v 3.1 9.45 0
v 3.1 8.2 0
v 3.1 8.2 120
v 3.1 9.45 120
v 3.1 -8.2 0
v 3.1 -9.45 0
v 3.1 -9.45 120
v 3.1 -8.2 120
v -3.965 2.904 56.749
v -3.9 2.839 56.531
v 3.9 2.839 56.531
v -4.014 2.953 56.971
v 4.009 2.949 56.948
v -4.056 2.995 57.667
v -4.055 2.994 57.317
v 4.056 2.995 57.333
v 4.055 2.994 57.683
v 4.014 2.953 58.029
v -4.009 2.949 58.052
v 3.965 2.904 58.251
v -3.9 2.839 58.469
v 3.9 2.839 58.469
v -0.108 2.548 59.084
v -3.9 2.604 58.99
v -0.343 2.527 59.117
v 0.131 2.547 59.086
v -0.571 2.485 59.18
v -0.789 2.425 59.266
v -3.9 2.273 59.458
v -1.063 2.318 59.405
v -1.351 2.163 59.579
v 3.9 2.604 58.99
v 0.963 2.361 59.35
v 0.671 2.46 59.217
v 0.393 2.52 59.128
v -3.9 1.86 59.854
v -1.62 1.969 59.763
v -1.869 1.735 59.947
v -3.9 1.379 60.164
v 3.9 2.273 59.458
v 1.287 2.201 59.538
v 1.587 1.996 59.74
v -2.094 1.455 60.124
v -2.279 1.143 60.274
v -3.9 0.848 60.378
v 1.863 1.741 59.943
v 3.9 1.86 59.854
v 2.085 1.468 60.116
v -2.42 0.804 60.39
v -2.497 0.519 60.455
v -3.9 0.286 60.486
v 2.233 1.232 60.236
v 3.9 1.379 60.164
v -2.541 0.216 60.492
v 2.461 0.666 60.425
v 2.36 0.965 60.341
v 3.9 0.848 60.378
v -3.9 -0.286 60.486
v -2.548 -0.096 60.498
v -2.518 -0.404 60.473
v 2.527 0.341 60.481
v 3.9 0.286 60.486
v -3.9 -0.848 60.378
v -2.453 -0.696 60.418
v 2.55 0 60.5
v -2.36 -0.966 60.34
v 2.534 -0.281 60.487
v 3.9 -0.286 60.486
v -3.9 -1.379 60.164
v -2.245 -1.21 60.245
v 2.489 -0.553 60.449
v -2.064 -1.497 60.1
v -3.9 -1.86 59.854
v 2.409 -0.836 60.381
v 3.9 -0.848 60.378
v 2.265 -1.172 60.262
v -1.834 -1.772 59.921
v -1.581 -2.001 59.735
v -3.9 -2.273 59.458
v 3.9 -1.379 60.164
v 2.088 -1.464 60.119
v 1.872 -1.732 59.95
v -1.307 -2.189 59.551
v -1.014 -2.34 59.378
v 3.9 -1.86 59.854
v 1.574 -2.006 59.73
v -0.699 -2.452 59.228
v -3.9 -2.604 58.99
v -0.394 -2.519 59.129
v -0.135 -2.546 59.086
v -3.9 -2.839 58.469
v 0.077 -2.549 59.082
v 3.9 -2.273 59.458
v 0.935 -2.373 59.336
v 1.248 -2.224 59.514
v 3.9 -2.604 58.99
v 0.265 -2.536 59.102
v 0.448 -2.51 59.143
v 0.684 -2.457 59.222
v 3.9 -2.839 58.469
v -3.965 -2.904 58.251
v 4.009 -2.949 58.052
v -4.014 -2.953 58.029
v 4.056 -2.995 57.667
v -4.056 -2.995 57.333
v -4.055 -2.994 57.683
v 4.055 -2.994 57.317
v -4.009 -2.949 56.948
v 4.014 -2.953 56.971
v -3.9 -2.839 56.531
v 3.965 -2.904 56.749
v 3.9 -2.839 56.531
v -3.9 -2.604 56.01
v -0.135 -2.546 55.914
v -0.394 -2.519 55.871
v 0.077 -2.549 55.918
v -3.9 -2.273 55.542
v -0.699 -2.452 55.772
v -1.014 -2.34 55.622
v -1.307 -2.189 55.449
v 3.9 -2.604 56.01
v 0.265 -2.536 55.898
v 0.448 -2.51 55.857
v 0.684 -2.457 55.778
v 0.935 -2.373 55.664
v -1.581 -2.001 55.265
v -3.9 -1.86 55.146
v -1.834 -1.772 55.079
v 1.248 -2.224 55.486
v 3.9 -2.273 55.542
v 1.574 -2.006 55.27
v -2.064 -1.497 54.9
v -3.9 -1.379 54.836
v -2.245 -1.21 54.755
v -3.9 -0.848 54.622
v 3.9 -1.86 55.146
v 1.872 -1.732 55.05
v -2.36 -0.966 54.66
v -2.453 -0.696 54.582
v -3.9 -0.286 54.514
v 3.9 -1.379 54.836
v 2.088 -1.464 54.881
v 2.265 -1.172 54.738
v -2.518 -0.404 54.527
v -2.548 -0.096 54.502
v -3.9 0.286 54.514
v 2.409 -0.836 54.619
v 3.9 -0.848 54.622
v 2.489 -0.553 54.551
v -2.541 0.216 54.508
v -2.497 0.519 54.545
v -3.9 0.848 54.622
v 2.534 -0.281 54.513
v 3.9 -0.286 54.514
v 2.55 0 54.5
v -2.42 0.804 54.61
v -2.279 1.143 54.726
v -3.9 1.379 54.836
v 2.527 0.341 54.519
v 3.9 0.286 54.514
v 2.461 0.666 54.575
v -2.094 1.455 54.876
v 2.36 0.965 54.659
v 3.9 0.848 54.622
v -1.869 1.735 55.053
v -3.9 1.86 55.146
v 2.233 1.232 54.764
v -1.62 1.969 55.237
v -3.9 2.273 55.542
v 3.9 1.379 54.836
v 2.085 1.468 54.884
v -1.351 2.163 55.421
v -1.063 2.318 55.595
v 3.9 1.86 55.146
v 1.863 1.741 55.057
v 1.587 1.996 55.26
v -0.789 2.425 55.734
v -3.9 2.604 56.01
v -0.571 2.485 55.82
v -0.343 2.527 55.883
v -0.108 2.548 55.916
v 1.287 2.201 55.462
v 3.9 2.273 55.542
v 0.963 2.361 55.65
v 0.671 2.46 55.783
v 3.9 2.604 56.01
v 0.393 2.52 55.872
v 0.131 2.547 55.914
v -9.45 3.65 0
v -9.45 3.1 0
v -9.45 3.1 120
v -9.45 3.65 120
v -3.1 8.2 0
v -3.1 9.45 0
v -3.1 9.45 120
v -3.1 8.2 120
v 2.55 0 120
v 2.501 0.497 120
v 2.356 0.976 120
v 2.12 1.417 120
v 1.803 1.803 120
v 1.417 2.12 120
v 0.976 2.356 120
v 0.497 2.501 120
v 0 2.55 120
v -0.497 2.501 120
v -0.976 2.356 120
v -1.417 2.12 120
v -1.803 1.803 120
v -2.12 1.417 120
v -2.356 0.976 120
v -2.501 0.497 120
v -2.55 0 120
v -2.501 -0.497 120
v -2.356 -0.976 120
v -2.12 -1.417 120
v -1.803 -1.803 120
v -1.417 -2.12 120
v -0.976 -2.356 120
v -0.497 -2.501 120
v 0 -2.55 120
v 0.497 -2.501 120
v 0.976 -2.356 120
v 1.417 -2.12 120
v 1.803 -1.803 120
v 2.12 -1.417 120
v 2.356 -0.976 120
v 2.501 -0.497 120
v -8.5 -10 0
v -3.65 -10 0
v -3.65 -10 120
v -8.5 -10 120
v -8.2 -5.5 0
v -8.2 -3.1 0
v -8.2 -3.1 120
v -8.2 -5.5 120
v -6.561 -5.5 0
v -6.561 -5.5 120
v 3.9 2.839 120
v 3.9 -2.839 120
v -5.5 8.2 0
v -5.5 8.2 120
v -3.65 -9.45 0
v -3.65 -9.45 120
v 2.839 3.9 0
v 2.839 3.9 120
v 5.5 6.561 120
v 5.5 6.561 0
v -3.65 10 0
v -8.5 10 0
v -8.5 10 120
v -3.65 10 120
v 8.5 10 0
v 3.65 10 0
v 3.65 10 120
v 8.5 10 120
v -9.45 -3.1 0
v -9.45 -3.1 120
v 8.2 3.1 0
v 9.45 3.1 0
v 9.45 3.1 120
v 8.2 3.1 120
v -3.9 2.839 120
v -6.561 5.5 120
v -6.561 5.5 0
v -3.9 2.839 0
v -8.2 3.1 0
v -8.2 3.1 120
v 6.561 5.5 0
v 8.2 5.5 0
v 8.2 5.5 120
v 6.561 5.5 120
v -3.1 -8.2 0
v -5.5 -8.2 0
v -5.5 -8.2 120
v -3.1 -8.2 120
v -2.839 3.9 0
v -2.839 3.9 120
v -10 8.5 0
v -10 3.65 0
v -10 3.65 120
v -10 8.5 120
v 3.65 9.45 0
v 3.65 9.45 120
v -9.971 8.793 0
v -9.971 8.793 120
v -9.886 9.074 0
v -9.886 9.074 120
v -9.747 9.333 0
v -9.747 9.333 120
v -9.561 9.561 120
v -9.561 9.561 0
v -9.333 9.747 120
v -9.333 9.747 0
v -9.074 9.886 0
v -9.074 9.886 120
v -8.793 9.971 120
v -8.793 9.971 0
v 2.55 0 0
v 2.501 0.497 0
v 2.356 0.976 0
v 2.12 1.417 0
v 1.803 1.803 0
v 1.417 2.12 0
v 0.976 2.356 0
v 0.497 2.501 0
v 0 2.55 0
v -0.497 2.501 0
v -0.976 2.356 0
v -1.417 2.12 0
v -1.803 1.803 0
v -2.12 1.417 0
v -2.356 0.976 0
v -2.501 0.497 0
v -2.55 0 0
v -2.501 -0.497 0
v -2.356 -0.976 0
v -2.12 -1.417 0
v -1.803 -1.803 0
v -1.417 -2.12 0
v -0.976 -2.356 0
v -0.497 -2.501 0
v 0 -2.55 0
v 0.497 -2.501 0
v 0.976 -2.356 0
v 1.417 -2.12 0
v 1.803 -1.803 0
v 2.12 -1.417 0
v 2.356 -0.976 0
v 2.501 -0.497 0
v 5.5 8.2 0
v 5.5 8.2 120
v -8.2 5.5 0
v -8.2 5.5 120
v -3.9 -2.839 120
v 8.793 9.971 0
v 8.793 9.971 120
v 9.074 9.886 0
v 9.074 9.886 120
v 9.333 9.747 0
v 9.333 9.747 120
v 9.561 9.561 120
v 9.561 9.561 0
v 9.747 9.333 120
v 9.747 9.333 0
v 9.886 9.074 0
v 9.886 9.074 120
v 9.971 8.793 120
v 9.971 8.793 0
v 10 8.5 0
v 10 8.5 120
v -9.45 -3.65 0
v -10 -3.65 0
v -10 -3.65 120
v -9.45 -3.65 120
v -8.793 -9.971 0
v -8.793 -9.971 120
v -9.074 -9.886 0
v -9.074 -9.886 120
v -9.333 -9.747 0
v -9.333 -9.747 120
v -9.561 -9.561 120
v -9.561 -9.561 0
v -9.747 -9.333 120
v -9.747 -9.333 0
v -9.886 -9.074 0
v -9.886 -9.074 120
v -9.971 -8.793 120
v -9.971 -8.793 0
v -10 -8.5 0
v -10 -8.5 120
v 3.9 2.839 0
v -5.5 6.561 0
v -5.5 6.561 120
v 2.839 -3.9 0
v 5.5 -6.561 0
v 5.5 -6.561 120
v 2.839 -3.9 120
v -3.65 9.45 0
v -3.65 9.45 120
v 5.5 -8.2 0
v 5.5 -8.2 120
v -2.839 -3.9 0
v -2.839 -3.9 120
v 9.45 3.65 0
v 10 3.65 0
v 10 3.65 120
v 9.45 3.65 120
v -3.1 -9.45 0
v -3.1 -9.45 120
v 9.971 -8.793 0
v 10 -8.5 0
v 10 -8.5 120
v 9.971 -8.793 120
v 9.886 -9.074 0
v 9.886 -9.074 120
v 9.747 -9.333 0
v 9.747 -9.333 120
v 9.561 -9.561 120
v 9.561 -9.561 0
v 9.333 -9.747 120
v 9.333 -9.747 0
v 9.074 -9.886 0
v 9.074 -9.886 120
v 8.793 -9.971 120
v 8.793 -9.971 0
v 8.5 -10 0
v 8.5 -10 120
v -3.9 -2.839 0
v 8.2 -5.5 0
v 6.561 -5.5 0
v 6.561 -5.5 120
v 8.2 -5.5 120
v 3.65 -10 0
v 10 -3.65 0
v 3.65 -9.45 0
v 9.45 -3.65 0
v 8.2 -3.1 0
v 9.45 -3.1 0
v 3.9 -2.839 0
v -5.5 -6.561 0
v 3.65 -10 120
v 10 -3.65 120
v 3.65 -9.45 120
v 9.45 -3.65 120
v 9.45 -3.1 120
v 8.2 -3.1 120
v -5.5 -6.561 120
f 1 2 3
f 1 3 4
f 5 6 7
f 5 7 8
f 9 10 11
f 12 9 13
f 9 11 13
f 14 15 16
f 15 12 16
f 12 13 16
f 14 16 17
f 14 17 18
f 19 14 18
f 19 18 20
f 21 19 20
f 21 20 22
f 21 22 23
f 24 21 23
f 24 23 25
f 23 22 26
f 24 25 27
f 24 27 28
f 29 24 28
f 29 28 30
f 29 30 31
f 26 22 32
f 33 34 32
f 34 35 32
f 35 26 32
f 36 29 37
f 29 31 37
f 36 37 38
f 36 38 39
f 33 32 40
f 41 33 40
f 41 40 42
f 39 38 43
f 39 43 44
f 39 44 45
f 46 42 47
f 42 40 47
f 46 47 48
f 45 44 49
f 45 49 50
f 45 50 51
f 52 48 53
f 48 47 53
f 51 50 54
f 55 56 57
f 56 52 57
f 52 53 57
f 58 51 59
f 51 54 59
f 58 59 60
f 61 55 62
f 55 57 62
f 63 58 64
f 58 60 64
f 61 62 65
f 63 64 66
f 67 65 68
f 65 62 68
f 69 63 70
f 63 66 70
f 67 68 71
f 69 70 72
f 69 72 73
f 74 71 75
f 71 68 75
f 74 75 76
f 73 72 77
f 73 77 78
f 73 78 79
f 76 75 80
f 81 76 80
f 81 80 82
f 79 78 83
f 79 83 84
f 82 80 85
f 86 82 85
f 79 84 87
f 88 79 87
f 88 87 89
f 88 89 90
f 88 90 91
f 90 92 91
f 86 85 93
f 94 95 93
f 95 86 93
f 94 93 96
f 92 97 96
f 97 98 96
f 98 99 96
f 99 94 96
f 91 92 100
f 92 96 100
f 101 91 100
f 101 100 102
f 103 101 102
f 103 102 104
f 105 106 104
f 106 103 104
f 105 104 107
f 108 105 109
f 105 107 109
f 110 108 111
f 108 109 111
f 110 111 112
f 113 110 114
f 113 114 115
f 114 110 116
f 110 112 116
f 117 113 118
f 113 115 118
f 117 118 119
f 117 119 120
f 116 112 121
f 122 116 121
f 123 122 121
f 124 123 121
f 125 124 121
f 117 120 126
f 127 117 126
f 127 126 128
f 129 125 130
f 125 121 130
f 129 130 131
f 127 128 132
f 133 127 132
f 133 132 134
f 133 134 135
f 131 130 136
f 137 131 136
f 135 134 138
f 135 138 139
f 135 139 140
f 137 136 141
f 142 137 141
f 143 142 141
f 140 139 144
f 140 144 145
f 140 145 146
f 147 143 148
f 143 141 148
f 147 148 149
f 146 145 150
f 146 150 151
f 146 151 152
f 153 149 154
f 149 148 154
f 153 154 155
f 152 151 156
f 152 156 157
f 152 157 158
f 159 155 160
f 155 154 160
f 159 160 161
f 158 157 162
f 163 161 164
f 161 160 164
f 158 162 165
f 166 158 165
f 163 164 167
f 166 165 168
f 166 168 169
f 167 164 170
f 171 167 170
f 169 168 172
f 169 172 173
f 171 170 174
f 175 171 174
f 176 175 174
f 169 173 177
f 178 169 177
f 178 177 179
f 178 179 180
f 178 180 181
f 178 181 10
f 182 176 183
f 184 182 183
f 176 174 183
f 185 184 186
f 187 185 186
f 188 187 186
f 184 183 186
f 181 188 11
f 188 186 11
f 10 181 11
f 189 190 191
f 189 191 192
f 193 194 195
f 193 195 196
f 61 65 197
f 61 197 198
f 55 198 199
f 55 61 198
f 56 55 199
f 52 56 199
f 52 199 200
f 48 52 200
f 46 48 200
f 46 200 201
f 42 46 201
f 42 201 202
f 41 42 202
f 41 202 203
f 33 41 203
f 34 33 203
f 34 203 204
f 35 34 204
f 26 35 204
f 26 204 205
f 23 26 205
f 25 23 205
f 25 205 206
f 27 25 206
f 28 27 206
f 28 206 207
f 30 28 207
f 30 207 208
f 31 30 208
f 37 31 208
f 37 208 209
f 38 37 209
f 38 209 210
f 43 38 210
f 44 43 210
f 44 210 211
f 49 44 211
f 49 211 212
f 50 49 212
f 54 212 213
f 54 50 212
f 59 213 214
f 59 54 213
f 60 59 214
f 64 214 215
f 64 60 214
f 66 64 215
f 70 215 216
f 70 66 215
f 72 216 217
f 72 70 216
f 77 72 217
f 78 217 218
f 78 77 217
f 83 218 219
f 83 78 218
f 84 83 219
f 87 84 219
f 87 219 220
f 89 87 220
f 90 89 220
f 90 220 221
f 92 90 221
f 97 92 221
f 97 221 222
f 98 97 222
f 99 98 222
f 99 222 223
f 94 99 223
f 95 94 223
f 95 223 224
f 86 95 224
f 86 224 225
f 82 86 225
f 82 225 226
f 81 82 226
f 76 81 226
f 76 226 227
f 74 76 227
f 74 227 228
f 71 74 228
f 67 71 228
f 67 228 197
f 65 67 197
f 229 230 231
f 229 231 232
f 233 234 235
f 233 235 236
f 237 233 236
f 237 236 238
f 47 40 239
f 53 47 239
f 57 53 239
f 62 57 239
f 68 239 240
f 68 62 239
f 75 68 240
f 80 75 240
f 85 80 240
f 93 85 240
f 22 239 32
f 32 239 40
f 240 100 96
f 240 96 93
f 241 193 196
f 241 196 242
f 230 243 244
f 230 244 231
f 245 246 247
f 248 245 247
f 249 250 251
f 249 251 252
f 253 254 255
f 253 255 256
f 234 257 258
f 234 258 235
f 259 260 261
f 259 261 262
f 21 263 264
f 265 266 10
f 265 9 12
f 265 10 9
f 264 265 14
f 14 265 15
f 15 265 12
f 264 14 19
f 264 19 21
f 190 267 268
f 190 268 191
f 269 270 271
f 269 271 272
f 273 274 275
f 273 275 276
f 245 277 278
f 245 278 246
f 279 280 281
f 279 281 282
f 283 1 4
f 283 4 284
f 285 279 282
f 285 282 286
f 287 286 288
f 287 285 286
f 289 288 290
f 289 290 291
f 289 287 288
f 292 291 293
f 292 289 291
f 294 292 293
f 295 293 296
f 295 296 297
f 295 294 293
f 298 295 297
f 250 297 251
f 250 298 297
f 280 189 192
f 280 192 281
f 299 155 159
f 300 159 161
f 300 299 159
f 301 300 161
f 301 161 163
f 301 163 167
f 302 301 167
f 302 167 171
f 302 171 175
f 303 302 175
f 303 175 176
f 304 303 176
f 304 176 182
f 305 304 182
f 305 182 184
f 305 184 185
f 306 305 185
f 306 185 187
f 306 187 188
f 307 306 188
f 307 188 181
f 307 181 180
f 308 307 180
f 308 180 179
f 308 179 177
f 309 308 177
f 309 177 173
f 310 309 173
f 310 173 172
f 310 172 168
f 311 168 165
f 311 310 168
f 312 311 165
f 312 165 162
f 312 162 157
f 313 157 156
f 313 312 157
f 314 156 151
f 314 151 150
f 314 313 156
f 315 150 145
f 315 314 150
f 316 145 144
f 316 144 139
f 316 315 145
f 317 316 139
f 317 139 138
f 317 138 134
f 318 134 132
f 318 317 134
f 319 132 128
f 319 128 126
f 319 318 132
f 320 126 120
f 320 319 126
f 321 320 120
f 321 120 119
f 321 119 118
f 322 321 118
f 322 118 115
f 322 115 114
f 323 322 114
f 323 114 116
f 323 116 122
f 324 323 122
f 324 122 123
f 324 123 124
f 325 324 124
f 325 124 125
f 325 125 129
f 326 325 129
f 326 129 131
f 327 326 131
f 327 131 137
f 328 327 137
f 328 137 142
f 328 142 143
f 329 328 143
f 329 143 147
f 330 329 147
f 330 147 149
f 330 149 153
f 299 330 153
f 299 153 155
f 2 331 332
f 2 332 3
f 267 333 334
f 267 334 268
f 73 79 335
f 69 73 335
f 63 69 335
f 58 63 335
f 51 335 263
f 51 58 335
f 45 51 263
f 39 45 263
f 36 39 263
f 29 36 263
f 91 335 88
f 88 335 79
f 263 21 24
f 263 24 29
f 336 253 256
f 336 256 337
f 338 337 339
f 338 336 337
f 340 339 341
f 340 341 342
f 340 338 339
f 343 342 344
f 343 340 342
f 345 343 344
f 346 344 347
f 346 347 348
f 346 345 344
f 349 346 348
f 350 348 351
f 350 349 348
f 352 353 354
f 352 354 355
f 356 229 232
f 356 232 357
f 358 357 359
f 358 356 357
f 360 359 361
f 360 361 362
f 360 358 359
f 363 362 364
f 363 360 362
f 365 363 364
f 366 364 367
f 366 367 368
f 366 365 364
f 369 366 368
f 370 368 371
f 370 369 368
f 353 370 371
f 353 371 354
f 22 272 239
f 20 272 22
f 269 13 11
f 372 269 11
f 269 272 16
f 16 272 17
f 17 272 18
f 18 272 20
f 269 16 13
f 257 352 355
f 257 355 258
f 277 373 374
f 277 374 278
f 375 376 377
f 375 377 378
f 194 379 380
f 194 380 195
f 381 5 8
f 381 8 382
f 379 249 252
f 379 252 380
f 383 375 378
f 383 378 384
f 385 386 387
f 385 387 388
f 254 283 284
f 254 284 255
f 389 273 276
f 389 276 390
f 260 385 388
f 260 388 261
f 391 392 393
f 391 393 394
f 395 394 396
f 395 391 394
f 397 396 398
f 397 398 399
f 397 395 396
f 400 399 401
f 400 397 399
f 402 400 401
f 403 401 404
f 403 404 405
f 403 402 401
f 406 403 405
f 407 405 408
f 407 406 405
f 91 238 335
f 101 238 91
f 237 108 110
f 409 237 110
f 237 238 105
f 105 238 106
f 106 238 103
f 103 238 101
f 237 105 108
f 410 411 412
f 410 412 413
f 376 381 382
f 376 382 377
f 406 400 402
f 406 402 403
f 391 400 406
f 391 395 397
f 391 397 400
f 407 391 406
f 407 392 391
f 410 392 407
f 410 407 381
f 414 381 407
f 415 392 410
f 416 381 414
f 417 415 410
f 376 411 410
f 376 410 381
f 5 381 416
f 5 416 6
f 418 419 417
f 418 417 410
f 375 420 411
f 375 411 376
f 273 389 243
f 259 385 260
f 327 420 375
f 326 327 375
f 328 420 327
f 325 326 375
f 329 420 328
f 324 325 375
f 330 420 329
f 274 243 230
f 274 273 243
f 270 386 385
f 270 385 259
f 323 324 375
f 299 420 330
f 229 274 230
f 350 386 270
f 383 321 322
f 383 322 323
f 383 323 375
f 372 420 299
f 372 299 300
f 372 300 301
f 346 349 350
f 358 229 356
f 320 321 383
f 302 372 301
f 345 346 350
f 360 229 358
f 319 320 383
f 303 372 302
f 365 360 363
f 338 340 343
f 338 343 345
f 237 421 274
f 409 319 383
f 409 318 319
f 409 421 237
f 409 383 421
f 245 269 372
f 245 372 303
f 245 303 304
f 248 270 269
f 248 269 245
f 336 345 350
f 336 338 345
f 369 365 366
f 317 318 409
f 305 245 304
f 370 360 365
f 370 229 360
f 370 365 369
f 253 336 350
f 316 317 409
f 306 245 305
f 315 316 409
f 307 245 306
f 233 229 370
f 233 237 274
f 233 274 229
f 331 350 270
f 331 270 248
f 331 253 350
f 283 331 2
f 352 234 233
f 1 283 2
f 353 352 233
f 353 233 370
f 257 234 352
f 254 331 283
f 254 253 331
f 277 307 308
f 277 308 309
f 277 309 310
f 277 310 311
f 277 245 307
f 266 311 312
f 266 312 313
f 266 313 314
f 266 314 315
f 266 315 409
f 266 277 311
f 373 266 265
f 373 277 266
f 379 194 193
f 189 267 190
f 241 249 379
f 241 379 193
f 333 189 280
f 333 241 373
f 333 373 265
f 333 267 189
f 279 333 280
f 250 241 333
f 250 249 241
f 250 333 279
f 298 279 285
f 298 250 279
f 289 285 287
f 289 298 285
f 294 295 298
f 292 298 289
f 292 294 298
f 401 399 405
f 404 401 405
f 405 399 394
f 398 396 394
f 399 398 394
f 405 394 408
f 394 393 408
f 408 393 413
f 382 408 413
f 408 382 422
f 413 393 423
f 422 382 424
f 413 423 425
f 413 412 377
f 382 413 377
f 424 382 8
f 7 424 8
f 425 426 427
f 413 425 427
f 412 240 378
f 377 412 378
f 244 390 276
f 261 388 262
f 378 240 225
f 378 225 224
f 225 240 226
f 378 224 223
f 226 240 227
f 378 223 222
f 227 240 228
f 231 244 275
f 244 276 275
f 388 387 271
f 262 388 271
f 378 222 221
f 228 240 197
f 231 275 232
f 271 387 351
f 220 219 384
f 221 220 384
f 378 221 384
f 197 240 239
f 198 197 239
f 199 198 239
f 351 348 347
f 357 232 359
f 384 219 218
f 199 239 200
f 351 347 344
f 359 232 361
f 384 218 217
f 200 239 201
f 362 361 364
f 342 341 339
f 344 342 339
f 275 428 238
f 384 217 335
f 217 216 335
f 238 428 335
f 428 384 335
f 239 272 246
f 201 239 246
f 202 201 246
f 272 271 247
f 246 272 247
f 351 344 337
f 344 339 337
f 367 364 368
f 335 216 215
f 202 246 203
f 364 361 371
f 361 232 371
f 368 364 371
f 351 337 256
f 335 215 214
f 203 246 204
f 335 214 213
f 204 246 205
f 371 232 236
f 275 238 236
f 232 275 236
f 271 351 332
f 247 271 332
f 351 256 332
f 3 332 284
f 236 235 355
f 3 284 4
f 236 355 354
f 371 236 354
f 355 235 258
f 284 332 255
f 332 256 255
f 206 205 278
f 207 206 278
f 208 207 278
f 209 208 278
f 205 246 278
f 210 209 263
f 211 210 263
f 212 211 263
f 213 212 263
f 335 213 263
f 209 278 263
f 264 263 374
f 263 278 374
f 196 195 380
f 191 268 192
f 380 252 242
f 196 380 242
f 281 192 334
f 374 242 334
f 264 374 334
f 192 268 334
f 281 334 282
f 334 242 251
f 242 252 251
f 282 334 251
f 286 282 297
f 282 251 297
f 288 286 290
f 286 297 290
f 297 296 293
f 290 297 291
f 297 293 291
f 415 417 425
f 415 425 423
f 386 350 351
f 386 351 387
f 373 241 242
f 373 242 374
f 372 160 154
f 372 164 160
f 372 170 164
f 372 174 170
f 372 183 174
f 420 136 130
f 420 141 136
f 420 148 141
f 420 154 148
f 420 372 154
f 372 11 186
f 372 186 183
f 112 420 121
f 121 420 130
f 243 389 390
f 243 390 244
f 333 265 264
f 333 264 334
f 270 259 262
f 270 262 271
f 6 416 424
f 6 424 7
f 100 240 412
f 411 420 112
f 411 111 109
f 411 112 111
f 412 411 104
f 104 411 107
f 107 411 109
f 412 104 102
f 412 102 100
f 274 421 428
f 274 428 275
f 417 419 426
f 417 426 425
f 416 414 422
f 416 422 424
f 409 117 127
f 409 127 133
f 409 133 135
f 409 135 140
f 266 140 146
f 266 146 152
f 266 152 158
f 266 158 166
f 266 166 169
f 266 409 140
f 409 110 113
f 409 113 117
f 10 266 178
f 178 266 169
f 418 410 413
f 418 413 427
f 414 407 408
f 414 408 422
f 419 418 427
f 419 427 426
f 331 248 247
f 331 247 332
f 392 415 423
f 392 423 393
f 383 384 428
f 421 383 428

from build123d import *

# Parameters (mm, degrees)
SKETCH_2_R          = 2.55
EXTRUDE_1_DEPTH     = 120
SKETCH_3_R          = 3
CUT_EXTRUDE_1_DEPTH = 123.065556157


with BuildPart() as part:
    # 草图2 → 凸台-拉伸1 (new body)
    with BuildSketch(Plane.XY):
        with BuildLine():
            Line((-3.9, 2.839339828), (-6.560660172, 5.5))
            Line((-6.560660172, 5.5), (-8.2, 5.5))
            Line((-8.2, 5.5), (-8.2, 3.1))
            Line((-8.2, 3.1), (-9.45, 3.1))
            Line((-9.45, 3.1), (-9.45, 3.65))
            Line((-9.45, 3.65), (-10, 3.65))
            Line((-10, 3.65), (-10, 8.5))
            ThreePointArc((-10, 8.5), (-9.560660172, 9.560660172), (-8.5, 10))
            Line((-8.5, 10), (-3.65, 10))
            Line((-3.65, 10), (-3.65, 9.45))
            Line((-3.65, 9.45), (-3.1, 9.45))
            Line((-3.1, 9.45), (-3.1, 8.2))
            Line((-3.1, 8.2), (-5.5, 8.2))
            Line((-5.5, 8.2), (-5.5, 6.560660172))
            Line((-5.5, 6.560660172), (-2.839339828, 3.9))
            Line((-2.839339828, 3.9), (2.839339828, 3.9))
            Line((2.839339828, 3.9), (5.5, 6.560660172))
            Line((5.5, 6.560660172), (5.5, 8.2))
            Line((5.5, 8.2), (3.1, 8.2))
            Line((3.1, 8.2), (3.1, 9.45))
            Line((3.1, 9.45), (3.65, 9.45))
            Line((3.65, 9.45), (3.65, 10))
            Line((3.65, 10), (8.5, 10))
            ThreePointArc((8.5, 10), (9.560660172, 9.560660172), (10, 8.5))
            Line((10, 8.5), (10, 3.65))
            Line((10, 3.65), (9.45, 3.65))
            Line((9.45, 3.65), (9.45, 3.1))
            Line((9.45, 3.1), (8.2, 3.1))
            Line((8.2, 3.1), (8.2, 5.5))
            Line((8.2, 5.5), (6.560660172, 5.5))
            Line((6.560660172, 5.5), (3.9, 2.839339828))
            Line((3.9, 2.839339828), (3.9, -2.839339828))
            Line((3.9, -2.839339828), (6.560660172, -5.5))
            Line((6.560660172, -5.5), (8.2, -5.5))
            Line((8.2, -5.5), (8.2, -3.1))
            Line((8.2, -3.1), (9.45, -3.1))
            Line((9.45, -3.1), (9.45, -3.65))
            Line((9.45, -3.65), (10, -3.65))
            Line((10, -3.65), (10, -8.5))
            ThreePointArc((10, -8.5), (9.560660172, -9.560660172), (8.5, -10))
            Line((8.5, -10), (3.65, -10))
            Line((3.65, -10), (3.65, -9.45))
            Line((3.65, -9.45), (3.1, -9.45))
            Line((3.1, -9.45), (3.1, -8.2))
            Line((3.1, -8.2), (5.5, -8.2))
            Line((5.5, -8.2), (5.5, -6.560660172))
            Line((5.5, -6.560660172), (2.839339828, -3.9))
            Line((2.839339828, -3.9), (-2.839339828, -3.9))
            Line((-2.839339828, -3.9), (-5.5, -6.560660172))
            Line((-5.5, -6.560660172), (-5.5, -8.2))
            Line((-5.5, -8.2), (-3.1, -8.2))
            Line((-3.1, -8.2), (-3.1, -9.45))
            Line((-3.1, -9.45), (-3.65, -9.45))
            Line((-3.65, -9.45), (-3.65, -10))
            Line((-3.65, -10), (-8.5, -10))
            ThreePointArc((-8.5, -10), (-9.560660172, -9.560660172), (-10, -8.5))
            Line((-10, -8.5), (-10, -3.65))
            Line((-10, -3.65), (-9.45, -3.65))
            Line((-9.45, -3.65), (-9.45, -3.1))
            Line((-9.45, -3.1), (-8.2, -3.1))
            Line((-8.2, -3.1), (-8.2, -5.5))
            Line((-8.2, -5.5), (-6.560660172, -5.5))
            Line((-6.560660172, -5.5), (-3.9, -2.839339828))
            Line((-3.9, -2.839339828), (-3.9, 2.839339828))
        make_face()
        Circle(SKETCH_2_R, mode=Mode.SUBTRACT)
    extrude(amount=EXTRUDE_1_DEPTH)

    # 草图3 → 切除-拉伸1 (cut, through all)
    with BuildSketch(Plane(origin=(10, 0, 0), x_dir=(0, 0, -1), z_dir=(1, 0, 0))):
        with Locations(Location((-57.5, 0, 0), (0, 0, 71.16400384))):
            Circle(SKETCH_3_R)
        with Locations((-302.5, 0)):
            Circle(SKETCH_3_R)
    extrude(amount=-CUT_EXTRUDE_1_DEPTH, mode=Mode.SUBTRACT)


solid = part.part
